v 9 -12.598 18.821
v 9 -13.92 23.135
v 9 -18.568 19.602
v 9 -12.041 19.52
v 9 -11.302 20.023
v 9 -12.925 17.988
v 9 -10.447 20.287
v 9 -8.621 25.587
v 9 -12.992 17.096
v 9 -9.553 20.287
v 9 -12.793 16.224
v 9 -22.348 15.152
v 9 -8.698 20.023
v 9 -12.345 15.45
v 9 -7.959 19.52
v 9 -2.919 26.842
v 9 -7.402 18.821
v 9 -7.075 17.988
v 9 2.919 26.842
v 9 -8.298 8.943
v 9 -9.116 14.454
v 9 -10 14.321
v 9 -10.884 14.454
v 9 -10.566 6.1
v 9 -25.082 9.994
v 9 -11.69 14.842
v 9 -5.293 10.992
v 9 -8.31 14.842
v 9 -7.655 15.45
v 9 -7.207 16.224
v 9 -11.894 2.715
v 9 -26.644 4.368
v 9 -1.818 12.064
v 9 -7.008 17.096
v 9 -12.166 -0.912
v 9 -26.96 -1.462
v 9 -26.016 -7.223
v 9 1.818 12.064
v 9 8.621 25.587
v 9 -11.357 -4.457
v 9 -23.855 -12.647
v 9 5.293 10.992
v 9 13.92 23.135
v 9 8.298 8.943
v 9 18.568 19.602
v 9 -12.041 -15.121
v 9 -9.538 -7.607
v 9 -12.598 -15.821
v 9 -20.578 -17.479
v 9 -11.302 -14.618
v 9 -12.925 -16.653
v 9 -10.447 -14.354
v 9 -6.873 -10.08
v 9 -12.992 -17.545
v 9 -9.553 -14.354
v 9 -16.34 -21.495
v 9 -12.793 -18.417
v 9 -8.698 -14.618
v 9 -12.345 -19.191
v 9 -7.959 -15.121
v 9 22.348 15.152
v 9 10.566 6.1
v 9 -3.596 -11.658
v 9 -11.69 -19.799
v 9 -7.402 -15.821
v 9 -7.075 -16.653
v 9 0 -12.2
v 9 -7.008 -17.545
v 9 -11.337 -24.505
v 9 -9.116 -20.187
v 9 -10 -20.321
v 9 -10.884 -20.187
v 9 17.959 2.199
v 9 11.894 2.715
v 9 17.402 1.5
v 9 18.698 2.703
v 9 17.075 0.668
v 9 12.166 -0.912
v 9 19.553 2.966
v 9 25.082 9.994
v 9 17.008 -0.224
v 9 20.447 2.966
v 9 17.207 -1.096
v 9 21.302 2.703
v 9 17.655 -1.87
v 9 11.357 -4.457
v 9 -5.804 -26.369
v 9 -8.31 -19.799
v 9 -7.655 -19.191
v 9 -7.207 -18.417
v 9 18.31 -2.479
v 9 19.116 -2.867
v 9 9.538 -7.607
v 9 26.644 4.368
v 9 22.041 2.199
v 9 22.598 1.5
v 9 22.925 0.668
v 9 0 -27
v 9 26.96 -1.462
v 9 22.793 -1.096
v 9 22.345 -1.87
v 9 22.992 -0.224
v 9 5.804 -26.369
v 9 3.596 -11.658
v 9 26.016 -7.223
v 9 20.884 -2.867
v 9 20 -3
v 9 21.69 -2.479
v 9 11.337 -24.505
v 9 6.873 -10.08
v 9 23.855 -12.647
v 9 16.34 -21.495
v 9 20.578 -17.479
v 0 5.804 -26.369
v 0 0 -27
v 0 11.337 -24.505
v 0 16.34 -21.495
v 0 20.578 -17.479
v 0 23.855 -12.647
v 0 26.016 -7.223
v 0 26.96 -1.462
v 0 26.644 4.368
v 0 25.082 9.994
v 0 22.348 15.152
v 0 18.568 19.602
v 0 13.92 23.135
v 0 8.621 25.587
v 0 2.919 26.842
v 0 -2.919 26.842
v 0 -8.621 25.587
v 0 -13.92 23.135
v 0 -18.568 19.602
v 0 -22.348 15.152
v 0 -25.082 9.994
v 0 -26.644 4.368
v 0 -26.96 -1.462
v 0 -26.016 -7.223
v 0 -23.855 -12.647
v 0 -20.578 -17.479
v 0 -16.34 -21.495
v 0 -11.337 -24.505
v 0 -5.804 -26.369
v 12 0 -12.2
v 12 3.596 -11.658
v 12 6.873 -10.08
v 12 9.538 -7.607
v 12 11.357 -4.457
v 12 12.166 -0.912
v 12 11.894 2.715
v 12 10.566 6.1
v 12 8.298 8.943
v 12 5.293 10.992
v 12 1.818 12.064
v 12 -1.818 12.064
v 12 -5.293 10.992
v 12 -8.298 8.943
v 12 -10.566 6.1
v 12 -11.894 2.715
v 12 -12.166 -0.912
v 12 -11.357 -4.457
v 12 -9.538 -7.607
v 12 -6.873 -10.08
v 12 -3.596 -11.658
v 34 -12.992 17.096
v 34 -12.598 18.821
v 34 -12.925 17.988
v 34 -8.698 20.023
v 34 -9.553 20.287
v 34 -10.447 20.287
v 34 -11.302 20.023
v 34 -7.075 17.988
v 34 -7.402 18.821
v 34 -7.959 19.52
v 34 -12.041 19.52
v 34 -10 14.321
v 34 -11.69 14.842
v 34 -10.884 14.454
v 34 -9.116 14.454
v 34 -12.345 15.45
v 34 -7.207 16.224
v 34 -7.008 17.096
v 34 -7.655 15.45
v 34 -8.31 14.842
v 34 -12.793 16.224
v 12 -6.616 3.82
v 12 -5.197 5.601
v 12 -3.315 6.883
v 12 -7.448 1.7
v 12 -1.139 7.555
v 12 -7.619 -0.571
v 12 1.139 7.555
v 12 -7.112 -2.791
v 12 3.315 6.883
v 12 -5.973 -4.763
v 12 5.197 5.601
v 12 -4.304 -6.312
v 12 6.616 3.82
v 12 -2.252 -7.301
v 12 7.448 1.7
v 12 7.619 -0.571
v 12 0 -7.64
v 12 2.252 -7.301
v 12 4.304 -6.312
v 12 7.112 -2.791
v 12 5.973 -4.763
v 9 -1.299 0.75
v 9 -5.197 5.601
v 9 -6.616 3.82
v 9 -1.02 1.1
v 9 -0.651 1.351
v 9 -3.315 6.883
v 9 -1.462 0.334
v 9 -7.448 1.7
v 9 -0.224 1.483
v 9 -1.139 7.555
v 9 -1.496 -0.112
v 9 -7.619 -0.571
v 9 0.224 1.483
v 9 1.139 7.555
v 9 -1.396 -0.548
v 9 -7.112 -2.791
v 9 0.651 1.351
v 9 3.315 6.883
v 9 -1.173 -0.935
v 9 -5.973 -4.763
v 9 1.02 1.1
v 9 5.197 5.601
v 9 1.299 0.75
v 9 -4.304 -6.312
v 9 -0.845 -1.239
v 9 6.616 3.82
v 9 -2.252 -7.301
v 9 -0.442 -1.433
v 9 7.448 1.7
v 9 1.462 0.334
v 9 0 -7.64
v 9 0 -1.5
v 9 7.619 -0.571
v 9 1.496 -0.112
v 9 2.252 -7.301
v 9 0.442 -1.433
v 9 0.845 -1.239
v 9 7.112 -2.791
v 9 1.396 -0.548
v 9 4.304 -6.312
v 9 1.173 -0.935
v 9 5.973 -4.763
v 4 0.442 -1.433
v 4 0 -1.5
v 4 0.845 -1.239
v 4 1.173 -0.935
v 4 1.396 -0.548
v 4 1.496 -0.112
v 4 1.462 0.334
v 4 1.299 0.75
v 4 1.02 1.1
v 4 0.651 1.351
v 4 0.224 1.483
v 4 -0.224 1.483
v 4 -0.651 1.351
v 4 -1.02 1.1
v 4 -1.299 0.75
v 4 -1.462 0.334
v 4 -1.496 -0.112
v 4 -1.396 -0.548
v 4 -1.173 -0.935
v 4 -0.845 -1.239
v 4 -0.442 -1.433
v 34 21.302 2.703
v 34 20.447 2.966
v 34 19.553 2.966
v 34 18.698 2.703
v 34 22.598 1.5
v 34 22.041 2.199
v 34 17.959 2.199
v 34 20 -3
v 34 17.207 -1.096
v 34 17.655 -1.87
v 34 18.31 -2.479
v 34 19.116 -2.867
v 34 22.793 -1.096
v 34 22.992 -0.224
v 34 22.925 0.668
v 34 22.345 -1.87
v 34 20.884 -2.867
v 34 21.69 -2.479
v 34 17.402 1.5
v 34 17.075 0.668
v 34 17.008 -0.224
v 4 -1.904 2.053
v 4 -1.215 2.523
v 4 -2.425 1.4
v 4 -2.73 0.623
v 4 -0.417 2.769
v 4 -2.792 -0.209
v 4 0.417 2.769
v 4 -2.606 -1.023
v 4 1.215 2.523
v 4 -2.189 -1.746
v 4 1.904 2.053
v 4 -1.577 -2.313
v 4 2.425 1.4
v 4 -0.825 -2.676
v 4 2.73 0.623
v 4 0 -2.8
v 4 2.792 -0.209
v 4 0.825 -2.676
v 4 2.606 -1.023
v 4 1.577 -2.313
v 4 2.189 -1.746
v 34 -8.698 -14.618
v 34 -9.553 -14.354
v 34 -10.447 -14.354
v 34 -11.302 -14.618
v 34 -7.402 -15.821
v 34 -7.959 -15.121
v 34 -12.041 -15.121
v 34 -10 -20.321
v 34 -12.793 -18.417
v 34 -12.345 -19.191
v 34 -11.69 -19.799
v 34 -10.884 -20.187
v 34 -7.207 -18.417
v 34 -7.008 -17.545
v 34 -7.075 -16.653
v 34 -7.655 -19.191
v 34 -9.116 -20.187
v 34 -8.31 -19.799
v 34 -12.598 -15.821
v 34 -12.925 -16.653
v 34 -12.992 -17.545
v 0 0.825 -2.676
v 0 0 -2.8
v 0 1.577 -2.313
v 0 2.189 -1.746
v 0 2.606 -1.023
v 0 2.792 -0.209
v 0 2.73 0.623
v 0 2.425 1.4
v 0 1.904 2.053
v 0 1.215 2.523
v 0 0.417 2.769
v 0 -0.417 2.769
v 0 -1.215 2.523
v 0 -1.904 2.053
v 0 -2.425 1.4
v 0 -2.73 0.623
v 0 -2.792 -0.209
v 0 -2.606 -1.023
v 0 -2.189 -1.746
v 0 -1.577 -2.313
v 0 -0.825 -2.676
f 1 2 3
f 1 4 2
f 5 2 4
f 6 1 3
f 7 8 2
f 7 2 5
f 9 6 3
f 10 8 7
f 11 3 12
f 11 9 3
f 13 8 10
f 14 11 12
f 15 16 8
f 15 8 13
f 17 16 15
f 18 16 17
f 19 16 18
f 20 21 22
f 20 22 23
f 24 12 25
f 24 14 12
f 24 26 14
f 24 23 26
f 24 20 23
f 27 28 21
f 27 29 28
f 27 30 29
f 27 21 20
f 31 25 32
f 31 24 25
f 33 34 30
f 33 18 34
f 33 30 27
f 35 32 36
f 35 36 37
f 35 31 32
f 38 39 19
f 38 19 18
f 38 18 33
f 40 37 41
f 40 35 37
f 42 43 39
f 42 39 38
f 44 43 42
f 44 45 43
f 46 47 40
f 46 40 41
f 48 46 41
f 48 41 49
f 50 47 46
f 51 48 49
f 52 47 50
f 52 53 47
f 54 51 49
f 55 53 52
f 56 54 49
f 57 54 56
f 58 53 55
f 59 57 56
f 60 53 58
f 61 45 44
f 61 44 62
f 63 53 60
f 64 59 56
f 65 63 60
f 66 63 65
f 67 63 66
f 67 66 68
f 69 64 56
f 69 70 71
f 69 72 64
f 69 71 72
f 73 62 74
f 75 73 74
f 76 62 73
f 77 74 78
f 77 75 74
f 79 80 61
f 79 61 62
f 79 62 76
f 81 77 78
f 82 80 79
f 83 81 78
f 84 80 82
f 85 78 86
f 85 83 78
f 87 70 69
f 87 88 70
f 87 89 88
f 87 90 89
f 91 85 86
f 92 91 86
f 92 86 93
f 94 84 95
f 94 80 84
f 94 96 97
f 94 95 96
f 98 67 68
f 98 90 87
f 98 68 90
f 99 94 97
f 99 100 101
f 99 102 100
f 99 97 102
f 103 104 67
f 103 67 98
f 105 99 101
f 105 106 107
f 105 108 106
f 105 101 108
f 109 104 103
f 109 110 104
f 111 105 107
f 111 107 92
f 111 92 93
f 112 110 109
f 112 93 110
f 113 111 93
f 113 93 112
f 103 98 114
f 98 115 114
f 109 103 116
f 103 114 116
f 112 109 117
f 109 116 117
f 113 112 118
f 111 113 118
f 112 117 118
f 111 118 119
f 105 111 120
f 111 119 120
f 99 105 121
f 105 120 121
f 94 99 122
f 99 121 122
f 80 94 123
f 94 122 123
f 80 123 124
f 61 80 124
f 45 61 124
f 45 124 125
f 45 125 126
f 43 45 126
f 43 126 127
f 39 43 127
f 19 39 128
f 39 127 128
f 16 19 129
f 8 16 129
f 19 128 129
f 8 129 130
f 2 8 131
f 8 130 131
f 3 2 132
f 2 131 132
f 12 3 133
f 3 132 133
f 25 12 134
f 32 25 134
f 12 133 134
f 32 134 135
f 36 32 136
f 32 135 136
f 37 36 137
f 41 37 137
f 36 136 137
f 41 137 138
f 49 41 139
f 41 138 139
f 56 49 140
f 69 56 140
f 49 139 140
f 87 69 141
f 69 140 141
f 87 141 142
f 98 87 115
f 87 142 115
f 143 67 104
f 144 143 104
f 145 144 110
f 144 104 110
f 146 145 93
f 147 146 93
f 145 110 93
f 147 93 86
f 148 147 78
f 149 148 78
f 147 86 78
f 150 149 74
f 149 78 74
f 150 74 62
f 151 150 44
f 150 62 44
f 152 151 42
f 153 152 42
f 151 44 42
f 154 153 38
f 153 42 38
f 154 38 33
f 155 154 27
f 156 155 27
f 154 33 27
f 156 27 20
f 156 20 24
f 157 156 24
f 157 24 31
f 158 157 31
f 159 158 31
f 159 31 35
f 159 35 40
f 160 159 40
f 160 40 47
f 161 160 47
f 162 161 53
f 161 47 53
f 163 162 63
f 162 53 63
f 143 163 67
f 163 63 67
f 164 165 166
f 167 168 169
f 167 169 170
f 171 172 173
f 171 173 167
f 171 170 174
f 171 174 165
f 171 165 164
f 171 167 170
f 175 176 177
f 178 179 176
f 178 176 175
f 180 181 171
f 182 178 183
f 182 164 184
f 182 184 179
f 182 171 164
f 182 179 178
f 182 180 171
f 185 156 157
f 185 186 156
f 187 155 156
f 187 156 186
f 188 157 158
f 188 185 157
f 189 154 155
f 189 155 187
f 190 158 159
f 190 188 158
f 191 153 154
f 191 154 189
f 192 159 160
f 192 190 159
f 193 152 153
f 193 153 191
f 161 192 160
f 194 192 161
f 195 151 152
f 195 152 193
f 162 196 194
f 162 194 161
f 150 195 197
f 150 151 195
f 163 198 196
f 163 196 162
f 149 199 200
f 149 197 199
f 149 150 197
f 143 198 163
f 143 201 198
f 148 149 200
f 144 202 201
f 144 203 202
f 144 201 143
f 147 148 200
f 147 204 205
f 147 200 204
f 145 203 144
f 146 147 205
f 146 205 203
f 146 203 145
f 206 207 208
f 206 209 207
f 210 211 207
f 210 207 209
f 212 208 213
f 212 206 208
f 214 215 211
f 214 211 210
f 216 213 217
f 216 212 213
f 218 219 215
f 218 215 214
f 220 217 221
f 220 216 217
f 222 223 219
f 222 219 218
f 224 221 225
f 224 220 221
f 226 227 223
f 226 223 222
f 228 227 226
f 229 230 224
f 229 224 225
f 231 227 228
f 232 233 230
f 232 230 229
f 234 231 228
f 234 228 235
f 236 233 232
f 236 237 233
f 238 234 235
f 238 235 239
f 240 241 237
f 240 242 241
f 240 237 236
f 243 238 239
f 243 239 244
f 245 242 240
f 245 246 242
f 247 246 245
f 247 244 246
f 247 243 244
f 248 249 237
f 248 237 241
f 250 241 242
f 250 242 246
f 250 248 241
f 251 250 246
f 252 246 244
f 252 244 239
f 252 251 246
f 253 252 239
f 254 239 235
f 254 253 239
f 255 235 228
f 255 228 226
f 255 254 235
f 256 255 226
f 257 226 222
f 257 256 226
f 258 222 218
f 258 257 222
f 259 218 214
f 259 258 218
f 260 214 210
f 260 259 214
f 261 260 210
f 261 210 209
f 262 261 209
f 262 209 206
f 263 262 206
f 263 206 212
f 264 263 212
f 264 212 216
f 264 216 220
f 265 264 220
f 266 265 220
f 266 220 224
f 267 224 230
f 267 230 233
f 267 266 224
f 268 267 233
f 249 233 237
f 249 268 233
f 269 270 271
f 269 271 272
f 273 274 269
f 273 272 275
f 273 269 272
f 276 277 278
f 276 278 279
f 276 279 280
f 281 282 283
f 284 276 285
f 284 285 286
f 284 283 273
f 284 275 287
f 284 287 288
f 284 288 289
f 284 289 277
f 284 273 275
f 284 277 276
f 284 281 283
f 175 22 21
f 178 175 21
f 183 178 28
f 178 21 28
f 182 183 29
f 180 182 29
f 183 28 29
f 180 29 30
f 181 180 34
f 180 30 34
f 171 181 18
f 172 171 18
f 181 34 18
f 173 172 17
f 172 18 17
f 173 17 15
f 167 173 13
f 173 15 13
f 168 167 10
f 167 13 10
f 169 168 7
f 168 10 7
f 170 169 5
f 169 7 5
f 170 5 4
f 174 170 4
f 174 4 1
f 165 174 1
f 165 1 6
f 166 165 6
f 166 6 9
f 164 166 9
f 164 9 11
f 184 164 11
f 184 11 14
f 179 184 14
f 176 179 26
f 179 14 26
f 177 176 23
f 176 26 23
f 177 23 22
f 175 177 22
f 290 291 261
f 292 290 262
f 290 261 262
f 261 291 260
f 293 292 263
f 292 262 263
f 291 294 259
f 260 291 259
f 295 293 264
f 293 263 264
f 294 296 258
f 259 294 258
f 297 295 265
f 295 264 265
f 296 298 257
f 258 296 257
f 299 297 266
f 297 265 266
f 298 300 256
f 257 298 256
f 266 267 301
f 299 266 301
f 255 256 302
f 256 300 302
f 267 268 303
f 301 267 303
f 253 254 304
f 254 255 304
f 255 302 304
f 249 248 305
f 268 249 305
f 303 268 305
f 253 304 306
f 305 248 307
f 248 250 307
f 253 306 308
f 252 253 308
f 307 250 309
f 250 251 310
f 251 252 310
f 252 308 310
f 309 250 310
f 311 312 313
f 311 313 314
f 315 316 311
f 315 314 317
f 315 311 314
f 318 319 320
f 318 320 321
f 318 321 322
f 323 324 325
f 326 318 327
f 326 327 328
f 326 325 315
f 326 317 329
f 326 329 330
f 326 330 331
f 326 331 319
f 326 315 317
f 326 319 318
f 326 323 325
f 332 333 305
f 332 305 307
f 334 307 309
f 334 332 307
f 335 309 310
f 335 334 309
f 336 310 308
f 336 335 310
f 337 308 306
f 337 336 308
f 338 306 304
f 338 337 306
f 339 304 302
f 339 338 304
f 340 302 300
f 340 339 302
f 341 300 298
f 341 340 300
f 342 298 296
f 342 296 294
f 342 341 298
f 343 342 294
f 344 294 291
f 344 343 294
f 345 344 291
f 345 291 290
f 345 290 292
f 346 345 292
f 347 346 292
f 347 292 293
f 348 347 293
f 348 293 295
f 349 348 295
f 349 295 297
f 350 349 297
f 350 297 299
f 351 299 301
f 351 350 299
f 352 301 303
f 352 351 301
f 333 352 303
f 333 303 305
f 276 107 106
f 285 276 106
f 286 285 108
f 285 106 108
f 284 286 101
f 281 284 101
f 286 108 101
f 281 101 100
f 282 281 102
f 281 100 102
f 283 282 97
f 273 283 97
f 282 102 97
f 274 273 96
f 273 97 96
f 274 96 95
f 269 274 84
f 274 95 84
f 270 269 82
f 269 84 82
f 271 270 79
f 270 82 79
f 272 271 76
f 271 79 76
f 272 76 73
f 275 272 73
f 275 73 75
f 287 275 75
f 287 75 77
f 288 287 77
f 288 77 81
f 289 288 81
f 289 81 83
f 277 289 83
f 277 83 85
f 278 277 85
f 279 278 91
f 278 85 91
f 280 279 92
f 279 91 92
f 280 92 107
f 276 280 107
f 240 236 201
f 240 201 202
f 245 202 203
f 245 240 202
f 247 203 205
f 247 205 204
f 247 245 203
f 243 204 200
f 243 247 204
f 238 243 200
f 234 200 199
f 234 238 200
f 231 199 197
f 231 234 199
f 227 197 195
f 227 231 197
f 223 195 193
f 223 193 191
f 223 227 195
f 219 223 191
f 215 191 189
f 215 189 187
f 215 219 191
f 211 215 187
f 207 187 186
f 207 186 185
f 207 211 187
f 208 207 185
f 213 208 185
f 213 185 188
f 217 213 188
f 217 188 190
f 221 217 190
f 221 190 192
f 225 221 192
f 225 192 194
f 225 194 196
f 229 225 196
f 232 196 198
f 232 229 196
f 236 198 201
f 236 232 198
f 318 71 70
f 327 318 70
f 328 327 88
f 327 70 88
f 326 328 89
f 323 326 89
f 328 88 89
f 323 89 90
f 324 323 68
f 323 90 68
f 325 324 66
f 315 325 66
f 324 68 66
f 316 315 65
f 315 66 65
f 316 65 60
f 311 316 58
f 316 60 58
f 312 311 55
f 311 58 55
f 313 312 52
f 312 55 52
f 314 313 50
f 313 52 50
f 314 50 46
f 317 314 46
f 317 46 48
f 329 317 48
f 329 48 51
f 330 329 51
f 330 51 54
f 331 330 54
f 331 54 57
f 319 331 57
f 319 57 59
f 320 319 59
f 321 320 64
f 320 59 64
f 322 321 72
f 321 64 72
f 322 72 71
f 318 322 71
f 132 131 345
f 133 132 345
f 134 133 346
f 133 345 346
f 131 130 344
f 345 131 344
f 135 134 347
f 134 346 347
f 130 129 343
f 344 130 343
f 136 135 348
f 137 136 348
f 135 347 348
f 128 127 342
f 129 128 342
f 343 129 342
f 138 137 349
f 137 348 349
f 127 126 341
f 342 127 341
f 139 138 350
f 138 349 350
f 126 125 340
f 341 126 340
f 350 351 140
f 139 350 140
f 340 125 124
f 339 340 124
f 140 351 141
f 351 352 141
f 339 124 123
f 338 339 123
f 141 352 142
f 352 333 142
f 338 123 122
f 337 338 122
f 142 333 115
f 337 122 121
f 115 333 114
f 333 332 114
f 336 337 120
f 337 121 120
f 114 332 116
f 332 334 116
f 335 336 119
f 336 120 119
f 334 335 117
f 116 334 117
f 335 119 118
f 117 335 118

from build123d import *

# Parameters (mm, degrees)
SKETCH1_R           = 27
SKETCH1_R_2         = 2.8
BOSS_EXTRUDE2_DEPTH = 4
SKETCH2_R           = 27
SKETCH2_R_2         = 2.8
SKETCH2_R_3         = 1.5
BOSS_EXTRUDE3_DEPTH = 5
SKETCH3_R           = 3
BOSS_EXTRUDE4_DEPTH = 25
SKETCH4_R           = 12.2
SKETCH4_R_2         = 7.64
BOSS_EXTRUDE5_DEPTH = 3


with BuildPart() as part:
    # Sketch1 → Boss-Extrude2 (new body)
    with BuildSketch(Plane(origin=(0, 0, 0), x_dir=(0, 0, -1), z_dir=(1, 0, 0))):
        Circle(SKETCH1_R)
        Circle(SKETCH1_R_2, mode=Mode.SUBTRACT)
    extrude(amount=BOSS_EXTRUDE2_DEPTH)

    # Sketch2 → Boss-Extrude3 (add)
    with BuildSketch(Plane(origin=(4, 0, 0), x_dir=(0, 0, -1), z_dir=(1, 0, 0))):
        Circle(SKETCH2_R)
        Circle(SKETCH2_R_2, mode=Mode.SUBTRACT)
        Circle(SKETCH2_R_2)
        Circle(SKETCH2_R_3, mode=Mode.SUBTRACT)
    extrude(amount=BOSS_EXTRUDE3_DEPTH)

    # Sketch3 → Boss-Extrude4 (add)
    with BuildSketch(Plane(origin=(9, 0, 0), x_dir=(0, 0, -1), z_dir=(1, 0, 0))):
        with Locations((0, 20)):
            Circle(SKETCH3_R)
        with Locations((17.320508076, -10)):
            Circle(SKETCH3_R)
        with Locations((-17.320508076, -10)):
            Circle(SKETCH3_R)
    extrude(amount=BOSS_EXTRUDE4_DEPTH)

    # Sketch4 → Boss-Extrude5 (add)
    with BuildSketch(Plane(origin=(9, 0, 0), x_dir=(0, 0, -1), z_dir=(1, 0, 0))):
        Circle(SKETCH4_R)
        Circle(SKETCH4_R_2, mode=Mode.SUBTRACT)
    extrude(amount=BOSS_EXTRUDE5_DEPTH)


solid = part.part
